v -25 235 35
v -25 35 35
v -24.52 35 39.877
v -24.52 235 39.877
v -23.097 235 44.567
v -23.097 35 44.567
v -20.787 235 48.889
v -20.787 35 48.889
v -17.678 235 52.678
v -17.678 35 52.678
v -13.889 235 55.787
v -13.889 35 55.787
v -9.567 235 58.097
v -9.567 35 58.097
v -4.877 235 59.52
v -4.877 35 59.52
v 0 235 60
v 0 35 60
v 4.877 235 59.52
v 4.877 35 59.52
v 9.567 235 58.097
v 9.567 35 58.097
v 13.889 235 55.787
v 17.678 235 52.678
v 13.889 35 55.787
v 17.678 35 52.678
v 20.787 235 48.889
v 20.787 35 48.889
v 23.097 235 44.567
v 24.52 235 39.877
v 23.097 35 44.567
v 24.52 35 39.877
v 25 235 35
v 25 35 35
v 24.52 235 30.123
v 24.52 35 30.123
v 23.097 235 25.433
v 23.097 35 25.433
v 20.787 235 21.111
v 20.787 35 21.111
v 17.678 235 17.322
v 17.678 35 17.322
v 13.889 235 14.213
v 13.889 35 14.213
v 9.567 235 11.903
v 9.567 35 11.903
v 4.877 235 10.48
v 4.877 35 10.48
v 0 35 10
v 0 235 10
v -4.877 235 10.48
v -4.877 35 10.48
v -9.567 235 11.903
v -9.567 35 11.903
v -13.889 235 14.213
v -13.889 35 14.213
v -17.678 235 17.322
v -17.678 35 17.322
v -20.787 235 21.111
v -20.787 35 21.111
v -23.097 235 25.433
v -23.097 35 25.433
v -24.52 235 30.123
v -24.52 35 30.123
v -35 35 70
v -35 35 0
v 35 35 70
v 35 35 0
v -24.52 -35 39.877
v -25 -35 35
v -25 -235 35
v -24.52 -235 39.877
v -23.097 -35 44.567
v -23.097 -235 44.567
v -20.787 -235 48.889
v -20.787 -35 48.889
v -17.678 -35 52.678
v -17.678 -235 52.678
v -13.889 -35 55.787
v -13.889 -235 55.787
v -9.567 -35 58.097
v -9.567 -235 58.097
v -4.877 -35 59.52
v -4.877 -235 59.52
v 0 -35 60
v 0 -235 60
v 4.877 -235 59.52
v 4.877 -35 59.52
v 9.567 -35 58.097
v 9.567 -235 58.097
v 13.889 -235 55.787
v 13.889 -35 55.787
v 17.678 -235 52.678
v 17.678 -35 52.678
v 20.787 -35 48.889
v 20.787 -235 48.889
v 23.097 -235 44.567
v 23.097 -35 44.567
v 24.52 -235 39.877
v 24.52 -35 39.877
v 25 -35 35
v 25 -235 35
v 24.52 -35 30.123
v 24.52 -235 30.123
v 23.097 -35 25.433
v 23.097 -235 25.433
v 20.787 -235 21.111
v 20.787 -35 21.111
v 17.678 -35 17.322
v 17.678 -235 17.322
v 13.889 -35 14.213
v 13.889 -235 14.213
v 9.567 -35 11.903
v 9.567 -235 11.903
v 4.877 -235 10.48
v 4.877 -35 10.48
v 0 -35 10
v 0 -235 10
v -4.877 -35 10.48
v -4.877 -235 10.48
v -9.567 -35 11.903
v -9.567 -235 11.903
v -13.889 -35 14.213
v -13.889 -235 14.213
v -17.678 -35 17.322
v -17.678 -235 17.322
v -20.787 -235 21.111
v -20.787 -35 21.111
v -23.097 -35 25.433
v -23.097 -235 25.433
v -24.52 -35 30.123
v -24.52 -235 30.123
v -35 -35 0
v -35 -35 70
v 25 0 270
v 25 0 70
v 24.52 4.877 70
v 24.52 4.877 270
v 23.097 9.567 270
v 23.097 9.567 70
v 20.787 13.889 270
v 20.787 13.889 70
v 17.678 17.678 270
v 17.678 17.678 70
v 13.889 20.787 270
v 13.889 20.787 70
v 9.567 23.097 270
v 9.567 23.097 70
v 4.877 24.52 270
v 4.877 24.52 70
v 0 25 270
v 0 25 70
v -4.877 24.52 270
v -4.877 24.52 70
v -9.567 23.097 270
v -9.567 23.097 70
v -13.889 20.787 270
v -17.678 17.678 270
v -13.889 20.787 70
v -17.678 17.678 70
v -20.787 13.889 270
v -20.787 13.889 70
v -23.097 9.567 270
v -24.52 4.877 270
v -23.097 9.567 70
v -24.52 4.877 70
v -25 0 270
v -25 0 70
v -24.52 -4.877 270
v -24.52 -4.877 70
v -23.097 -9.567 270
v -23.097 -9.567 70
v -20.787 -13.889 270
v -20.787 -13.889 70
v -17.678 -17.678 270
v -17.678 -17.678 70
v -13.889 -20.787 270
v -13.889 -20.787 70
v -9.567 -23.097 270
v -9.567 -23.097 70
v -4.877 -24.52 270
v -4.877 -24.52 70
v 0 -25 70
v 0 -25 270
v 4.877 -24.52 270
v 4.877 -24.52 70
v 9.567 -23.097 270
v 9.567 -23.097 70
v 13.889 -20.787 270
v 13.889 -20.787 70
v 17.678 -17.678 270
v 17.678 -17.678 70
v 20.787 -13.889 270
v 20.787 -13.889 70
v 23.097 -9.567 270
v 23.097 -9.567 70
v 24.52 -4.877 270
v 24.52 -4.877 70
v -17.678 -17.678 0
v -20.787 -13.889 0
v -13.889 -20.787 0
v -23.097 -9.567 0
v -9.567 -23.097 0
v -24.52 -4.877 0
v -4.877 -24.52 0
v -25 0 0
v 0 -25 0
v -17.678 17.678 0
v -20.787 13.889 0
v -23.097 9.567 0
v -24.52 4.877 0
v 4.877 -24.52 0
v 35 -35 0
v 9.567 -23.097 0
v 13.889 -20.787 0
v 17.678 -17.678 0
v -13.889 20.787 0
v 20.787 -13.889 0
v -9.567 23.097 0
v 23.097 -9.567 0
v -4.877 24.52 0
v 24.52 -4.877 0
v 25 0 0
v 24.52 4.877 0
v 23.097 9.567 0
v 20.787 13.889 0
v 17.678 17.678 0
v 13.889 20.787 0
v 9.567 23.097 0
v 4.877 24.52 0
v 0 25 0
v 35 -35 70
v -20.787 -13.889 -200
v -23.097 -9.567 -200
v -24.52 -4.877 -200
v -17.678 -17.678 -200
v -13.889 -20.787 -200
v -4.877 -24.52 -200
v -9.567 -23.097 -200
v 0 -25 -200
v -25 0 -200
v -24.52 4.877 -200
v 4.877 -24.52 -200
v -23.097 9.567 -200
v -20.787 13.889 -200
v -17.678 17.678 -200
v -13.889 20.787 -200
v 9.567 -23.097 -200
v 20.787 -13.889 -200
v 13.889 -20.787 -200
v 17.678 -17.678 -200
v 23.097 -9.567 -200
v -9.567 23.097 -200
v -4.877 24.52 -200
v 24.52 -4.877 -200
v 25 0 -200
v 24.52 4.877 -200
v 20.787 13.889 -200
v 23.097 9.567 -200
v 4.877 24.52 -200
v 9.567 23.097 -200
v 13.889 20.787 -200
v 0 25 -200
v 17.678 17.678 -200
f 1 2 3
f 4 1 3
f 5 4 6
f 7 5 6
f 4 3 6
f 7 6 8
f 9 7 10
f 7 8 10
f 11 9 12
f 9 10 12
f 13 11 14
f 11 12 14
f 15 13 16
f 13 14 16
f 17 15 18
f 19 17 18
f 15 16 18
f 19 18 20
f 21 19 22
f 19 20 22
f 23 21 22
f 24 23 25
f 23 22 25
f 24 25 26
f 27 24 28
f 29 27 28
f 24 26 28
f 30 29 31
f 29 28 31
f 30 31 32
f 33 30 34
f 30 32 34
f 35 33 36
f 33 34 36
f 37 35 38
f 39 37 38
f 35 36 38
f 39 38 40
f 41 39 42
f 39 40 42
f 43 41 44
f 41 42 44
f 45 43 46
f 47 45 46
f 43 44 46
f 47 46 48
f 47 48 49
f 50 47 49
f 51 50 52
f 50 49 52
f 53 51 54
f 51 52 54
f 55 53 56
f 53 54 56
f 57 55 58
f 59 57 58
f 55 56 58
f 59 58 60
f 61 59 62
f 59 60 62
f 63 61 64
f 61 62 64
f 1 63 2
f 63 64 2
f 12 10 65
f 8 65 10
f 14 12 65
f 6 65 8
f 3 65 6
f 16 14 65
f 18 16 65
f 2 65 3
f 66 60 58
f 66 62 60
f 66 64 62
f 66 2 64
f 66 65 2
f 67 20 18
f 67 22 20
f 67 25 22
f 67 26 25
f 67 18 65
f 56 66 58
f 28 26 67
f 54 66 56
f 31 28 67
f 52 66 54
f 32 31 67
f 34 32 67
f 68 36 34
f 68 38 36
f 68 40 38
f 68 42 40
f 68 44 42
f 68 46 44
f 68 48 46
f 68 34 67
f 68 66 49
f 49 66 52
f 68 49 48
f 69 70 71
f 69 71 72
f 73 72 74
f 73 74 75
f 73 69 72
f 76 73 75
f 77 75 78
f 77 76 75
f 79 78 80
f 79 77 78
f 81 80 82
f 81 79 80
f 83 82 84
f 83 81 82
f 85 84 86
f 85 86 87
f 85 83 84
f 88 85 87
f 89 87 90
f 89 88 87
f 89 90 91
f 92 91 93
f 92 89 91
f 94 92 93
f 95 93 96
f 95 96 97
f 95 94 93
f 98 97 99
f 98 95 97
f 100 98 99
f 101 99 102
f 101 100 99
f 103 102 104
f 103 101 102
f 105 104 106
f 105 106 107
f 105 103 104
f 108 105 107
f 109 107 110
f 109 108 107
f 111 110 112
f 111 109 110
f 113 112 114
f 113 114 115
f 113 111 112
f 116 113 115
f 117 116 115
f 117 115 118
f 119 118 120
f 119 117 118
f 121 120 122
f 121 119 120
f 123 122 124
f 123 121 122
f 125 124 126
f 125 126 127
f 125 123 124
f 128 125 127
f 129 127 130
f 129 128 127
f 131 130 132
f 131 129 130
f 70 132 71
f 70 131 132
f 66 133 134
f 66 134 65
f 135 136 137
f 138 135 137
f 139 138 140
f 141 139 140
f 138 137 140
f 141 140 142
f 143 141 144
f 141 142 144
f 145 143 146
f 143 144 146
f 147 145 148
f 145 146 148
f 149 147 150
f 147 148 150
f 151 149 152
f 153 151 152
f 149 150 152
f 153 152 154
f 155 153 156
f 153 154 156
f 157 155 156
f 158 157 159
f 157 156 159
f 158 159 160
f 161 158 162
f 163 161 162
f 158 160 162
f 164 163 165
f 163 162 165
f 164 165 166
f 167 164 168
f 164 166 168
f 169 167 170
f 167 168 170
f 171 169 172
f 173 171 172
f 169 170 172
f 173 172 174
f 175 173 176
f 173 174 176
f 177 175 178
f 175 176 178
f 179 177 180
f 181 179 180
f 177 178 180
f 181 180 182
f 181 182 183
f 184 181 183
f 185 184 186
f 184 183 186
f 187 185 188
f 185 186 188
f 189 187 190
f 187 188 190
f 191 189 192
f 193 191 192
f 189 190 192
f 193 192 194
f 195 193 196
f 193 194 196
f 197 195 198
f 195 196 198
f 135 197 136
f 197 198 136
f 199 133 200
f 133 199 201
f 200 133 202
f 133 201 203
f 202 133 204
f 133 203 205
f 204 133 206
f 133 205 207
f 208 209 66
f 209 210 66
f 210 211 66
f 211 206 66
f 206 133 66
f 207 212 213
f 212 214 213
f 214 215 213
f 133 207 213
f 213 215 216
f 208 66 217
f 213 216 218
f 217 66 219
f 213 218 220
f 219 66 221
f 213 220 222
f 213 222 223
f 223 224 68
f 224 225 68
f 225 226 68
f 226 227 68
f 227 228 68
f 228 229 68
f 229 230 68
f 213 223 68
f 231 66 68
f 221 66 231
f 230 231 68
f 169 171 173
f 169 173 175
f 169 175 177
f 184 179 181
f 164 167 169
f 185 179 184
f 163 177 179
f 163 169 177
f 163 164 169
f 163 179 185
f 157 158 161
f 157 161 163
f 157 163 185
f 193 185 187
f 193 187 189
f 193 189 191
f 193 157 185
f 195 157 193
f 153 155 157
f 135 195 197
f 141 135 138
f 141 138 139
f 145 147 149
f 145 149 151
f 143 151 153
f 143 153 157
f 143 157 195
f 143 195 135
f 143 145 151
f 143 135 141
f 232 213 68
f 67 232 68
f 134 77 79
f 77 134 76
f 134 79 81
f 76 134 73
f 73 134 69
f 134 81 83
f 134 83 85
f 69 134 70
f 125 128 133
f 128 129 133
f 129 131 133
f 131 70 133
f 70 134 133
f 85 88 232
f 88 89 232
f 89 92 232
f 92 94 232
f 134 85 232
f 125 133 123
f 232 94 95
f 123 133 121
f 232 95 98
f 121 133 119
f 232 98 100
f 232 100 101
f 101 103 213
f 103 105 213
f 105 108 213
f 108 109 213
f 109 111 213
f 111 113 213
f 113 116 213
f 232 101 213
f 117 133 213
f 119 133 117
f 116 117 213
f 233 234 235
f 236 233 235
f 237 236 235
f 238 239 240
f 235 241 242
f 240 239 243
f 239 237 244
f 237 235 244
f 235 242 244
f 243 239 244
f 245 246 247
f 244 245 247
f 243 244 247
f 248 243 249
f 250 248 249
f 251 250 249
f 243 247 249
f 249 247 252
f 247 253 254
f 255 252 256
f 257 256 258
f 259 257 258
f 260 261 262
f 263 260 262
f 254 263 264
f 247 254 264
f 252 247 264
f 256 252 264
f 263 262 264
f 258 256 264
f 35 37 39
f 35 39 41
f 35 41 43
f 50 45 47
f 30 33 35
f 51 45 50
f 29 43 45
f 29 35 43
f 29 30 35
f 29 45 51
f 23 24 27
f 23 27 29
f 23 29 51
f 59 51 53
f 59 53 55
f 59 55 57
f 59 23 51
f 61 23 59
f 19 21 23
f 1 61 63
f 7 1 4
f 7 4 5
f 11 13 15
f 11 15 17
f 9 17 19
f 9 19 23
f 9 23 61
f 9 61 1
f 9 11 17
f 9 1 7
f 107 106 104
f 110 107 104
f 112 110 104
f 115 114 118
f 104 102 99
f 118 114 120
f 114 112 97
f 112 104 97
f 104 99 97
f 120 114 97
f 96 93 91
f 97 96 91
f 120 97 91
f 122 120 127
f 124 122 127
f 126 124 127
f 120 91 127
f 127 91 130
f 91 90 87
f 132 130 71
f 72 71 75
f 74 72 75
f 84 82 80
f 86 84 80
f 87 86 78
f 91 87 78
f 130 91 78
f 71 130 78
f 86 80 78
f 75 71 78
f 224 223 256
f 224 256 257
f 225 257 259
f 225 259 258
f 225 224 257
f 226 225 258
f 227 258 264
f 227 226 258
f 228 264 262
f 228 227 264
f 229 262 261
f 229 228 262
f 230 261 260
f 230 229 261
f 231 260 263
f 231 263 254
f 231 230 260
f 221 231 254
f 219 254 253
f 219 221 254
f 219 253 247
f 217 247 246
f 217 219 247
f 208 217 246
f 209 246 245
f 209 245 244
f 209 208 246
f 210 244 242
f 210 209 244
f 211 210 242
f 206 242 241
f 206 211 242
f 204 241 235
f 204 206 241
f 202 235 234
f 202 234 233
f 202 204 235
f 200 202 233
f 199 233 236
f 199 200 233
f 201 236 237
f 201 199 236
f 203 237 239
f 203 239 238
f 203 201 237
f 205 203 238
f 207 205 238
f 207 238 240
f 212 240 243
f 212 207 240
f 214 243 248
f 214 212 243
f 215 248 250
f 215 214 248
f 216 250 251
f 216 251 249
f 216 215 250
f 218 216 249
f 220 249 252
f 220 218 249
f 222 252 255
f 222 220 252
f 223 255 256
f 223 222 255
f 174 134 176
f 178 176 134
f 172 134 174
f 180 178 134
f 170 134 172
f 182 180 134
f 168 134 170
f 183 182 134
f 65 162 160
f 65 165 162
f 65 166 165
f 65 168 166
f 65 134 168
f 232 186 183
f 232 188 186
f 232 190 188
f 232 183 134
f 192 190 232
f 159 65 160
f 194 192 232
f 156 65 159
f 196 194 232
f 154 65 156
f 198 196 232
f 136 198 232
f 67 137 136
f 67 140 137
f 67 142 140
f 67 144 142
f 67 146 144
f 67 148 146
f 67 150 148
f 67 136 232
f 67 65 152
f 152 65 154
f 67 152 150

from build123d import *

# Parameters (mm, degrees)
SKETCH_1_W      = 70
SKETCH_1_H      = 70
EXTRUDE_1_DEPTH = 70
SKETCH_4_R      = 25
EXTRUDE_2_DEPTH = 200
SKETCH_5_R      = 25
EXTRUDE_3_DEPTH = 200


with BuildPart() as part:
    # 스케치1 → 보스-돌출1 (new body)
    with BuildSketch(Plane.XY):
        Rectangle(SKETCH_1_W, SKETCH_1_H)
    extrude(amount=EXTRUDE_1_DEPTH)

    # 스케치4 → 보스-돌출2 (add)
    with BuildSketch(Plane.XY.offset(70)):
        Circle(SKETCH_4_R)
    extrude_2 = extrude(amount=EXTRUDE_2_DEPTH)

    # 대칭 복사1: 보스-돌출2 across plane
    add(extrude_2.mirror(Plane.XY.offset(35)))

    # 스케치5 → 보스-돌출3 (add)
    with BuildSketch(Plane(origin=(0, 35, 0), x_dir=(1, 0, 0), z_dir=(0, 1, 0))):
        with Locations(Location((0, -35, 0), (0, 0, 180))):
            Circle(SKETCH_5_R)
    extrude_3 = extrude(amount=EXTRUDE_3_DEPTH)

    # 대칭 복사2: 보스-돌출3 across plane
    add(extrude_3.mirror(Plane.ZX))


solid = part.part
